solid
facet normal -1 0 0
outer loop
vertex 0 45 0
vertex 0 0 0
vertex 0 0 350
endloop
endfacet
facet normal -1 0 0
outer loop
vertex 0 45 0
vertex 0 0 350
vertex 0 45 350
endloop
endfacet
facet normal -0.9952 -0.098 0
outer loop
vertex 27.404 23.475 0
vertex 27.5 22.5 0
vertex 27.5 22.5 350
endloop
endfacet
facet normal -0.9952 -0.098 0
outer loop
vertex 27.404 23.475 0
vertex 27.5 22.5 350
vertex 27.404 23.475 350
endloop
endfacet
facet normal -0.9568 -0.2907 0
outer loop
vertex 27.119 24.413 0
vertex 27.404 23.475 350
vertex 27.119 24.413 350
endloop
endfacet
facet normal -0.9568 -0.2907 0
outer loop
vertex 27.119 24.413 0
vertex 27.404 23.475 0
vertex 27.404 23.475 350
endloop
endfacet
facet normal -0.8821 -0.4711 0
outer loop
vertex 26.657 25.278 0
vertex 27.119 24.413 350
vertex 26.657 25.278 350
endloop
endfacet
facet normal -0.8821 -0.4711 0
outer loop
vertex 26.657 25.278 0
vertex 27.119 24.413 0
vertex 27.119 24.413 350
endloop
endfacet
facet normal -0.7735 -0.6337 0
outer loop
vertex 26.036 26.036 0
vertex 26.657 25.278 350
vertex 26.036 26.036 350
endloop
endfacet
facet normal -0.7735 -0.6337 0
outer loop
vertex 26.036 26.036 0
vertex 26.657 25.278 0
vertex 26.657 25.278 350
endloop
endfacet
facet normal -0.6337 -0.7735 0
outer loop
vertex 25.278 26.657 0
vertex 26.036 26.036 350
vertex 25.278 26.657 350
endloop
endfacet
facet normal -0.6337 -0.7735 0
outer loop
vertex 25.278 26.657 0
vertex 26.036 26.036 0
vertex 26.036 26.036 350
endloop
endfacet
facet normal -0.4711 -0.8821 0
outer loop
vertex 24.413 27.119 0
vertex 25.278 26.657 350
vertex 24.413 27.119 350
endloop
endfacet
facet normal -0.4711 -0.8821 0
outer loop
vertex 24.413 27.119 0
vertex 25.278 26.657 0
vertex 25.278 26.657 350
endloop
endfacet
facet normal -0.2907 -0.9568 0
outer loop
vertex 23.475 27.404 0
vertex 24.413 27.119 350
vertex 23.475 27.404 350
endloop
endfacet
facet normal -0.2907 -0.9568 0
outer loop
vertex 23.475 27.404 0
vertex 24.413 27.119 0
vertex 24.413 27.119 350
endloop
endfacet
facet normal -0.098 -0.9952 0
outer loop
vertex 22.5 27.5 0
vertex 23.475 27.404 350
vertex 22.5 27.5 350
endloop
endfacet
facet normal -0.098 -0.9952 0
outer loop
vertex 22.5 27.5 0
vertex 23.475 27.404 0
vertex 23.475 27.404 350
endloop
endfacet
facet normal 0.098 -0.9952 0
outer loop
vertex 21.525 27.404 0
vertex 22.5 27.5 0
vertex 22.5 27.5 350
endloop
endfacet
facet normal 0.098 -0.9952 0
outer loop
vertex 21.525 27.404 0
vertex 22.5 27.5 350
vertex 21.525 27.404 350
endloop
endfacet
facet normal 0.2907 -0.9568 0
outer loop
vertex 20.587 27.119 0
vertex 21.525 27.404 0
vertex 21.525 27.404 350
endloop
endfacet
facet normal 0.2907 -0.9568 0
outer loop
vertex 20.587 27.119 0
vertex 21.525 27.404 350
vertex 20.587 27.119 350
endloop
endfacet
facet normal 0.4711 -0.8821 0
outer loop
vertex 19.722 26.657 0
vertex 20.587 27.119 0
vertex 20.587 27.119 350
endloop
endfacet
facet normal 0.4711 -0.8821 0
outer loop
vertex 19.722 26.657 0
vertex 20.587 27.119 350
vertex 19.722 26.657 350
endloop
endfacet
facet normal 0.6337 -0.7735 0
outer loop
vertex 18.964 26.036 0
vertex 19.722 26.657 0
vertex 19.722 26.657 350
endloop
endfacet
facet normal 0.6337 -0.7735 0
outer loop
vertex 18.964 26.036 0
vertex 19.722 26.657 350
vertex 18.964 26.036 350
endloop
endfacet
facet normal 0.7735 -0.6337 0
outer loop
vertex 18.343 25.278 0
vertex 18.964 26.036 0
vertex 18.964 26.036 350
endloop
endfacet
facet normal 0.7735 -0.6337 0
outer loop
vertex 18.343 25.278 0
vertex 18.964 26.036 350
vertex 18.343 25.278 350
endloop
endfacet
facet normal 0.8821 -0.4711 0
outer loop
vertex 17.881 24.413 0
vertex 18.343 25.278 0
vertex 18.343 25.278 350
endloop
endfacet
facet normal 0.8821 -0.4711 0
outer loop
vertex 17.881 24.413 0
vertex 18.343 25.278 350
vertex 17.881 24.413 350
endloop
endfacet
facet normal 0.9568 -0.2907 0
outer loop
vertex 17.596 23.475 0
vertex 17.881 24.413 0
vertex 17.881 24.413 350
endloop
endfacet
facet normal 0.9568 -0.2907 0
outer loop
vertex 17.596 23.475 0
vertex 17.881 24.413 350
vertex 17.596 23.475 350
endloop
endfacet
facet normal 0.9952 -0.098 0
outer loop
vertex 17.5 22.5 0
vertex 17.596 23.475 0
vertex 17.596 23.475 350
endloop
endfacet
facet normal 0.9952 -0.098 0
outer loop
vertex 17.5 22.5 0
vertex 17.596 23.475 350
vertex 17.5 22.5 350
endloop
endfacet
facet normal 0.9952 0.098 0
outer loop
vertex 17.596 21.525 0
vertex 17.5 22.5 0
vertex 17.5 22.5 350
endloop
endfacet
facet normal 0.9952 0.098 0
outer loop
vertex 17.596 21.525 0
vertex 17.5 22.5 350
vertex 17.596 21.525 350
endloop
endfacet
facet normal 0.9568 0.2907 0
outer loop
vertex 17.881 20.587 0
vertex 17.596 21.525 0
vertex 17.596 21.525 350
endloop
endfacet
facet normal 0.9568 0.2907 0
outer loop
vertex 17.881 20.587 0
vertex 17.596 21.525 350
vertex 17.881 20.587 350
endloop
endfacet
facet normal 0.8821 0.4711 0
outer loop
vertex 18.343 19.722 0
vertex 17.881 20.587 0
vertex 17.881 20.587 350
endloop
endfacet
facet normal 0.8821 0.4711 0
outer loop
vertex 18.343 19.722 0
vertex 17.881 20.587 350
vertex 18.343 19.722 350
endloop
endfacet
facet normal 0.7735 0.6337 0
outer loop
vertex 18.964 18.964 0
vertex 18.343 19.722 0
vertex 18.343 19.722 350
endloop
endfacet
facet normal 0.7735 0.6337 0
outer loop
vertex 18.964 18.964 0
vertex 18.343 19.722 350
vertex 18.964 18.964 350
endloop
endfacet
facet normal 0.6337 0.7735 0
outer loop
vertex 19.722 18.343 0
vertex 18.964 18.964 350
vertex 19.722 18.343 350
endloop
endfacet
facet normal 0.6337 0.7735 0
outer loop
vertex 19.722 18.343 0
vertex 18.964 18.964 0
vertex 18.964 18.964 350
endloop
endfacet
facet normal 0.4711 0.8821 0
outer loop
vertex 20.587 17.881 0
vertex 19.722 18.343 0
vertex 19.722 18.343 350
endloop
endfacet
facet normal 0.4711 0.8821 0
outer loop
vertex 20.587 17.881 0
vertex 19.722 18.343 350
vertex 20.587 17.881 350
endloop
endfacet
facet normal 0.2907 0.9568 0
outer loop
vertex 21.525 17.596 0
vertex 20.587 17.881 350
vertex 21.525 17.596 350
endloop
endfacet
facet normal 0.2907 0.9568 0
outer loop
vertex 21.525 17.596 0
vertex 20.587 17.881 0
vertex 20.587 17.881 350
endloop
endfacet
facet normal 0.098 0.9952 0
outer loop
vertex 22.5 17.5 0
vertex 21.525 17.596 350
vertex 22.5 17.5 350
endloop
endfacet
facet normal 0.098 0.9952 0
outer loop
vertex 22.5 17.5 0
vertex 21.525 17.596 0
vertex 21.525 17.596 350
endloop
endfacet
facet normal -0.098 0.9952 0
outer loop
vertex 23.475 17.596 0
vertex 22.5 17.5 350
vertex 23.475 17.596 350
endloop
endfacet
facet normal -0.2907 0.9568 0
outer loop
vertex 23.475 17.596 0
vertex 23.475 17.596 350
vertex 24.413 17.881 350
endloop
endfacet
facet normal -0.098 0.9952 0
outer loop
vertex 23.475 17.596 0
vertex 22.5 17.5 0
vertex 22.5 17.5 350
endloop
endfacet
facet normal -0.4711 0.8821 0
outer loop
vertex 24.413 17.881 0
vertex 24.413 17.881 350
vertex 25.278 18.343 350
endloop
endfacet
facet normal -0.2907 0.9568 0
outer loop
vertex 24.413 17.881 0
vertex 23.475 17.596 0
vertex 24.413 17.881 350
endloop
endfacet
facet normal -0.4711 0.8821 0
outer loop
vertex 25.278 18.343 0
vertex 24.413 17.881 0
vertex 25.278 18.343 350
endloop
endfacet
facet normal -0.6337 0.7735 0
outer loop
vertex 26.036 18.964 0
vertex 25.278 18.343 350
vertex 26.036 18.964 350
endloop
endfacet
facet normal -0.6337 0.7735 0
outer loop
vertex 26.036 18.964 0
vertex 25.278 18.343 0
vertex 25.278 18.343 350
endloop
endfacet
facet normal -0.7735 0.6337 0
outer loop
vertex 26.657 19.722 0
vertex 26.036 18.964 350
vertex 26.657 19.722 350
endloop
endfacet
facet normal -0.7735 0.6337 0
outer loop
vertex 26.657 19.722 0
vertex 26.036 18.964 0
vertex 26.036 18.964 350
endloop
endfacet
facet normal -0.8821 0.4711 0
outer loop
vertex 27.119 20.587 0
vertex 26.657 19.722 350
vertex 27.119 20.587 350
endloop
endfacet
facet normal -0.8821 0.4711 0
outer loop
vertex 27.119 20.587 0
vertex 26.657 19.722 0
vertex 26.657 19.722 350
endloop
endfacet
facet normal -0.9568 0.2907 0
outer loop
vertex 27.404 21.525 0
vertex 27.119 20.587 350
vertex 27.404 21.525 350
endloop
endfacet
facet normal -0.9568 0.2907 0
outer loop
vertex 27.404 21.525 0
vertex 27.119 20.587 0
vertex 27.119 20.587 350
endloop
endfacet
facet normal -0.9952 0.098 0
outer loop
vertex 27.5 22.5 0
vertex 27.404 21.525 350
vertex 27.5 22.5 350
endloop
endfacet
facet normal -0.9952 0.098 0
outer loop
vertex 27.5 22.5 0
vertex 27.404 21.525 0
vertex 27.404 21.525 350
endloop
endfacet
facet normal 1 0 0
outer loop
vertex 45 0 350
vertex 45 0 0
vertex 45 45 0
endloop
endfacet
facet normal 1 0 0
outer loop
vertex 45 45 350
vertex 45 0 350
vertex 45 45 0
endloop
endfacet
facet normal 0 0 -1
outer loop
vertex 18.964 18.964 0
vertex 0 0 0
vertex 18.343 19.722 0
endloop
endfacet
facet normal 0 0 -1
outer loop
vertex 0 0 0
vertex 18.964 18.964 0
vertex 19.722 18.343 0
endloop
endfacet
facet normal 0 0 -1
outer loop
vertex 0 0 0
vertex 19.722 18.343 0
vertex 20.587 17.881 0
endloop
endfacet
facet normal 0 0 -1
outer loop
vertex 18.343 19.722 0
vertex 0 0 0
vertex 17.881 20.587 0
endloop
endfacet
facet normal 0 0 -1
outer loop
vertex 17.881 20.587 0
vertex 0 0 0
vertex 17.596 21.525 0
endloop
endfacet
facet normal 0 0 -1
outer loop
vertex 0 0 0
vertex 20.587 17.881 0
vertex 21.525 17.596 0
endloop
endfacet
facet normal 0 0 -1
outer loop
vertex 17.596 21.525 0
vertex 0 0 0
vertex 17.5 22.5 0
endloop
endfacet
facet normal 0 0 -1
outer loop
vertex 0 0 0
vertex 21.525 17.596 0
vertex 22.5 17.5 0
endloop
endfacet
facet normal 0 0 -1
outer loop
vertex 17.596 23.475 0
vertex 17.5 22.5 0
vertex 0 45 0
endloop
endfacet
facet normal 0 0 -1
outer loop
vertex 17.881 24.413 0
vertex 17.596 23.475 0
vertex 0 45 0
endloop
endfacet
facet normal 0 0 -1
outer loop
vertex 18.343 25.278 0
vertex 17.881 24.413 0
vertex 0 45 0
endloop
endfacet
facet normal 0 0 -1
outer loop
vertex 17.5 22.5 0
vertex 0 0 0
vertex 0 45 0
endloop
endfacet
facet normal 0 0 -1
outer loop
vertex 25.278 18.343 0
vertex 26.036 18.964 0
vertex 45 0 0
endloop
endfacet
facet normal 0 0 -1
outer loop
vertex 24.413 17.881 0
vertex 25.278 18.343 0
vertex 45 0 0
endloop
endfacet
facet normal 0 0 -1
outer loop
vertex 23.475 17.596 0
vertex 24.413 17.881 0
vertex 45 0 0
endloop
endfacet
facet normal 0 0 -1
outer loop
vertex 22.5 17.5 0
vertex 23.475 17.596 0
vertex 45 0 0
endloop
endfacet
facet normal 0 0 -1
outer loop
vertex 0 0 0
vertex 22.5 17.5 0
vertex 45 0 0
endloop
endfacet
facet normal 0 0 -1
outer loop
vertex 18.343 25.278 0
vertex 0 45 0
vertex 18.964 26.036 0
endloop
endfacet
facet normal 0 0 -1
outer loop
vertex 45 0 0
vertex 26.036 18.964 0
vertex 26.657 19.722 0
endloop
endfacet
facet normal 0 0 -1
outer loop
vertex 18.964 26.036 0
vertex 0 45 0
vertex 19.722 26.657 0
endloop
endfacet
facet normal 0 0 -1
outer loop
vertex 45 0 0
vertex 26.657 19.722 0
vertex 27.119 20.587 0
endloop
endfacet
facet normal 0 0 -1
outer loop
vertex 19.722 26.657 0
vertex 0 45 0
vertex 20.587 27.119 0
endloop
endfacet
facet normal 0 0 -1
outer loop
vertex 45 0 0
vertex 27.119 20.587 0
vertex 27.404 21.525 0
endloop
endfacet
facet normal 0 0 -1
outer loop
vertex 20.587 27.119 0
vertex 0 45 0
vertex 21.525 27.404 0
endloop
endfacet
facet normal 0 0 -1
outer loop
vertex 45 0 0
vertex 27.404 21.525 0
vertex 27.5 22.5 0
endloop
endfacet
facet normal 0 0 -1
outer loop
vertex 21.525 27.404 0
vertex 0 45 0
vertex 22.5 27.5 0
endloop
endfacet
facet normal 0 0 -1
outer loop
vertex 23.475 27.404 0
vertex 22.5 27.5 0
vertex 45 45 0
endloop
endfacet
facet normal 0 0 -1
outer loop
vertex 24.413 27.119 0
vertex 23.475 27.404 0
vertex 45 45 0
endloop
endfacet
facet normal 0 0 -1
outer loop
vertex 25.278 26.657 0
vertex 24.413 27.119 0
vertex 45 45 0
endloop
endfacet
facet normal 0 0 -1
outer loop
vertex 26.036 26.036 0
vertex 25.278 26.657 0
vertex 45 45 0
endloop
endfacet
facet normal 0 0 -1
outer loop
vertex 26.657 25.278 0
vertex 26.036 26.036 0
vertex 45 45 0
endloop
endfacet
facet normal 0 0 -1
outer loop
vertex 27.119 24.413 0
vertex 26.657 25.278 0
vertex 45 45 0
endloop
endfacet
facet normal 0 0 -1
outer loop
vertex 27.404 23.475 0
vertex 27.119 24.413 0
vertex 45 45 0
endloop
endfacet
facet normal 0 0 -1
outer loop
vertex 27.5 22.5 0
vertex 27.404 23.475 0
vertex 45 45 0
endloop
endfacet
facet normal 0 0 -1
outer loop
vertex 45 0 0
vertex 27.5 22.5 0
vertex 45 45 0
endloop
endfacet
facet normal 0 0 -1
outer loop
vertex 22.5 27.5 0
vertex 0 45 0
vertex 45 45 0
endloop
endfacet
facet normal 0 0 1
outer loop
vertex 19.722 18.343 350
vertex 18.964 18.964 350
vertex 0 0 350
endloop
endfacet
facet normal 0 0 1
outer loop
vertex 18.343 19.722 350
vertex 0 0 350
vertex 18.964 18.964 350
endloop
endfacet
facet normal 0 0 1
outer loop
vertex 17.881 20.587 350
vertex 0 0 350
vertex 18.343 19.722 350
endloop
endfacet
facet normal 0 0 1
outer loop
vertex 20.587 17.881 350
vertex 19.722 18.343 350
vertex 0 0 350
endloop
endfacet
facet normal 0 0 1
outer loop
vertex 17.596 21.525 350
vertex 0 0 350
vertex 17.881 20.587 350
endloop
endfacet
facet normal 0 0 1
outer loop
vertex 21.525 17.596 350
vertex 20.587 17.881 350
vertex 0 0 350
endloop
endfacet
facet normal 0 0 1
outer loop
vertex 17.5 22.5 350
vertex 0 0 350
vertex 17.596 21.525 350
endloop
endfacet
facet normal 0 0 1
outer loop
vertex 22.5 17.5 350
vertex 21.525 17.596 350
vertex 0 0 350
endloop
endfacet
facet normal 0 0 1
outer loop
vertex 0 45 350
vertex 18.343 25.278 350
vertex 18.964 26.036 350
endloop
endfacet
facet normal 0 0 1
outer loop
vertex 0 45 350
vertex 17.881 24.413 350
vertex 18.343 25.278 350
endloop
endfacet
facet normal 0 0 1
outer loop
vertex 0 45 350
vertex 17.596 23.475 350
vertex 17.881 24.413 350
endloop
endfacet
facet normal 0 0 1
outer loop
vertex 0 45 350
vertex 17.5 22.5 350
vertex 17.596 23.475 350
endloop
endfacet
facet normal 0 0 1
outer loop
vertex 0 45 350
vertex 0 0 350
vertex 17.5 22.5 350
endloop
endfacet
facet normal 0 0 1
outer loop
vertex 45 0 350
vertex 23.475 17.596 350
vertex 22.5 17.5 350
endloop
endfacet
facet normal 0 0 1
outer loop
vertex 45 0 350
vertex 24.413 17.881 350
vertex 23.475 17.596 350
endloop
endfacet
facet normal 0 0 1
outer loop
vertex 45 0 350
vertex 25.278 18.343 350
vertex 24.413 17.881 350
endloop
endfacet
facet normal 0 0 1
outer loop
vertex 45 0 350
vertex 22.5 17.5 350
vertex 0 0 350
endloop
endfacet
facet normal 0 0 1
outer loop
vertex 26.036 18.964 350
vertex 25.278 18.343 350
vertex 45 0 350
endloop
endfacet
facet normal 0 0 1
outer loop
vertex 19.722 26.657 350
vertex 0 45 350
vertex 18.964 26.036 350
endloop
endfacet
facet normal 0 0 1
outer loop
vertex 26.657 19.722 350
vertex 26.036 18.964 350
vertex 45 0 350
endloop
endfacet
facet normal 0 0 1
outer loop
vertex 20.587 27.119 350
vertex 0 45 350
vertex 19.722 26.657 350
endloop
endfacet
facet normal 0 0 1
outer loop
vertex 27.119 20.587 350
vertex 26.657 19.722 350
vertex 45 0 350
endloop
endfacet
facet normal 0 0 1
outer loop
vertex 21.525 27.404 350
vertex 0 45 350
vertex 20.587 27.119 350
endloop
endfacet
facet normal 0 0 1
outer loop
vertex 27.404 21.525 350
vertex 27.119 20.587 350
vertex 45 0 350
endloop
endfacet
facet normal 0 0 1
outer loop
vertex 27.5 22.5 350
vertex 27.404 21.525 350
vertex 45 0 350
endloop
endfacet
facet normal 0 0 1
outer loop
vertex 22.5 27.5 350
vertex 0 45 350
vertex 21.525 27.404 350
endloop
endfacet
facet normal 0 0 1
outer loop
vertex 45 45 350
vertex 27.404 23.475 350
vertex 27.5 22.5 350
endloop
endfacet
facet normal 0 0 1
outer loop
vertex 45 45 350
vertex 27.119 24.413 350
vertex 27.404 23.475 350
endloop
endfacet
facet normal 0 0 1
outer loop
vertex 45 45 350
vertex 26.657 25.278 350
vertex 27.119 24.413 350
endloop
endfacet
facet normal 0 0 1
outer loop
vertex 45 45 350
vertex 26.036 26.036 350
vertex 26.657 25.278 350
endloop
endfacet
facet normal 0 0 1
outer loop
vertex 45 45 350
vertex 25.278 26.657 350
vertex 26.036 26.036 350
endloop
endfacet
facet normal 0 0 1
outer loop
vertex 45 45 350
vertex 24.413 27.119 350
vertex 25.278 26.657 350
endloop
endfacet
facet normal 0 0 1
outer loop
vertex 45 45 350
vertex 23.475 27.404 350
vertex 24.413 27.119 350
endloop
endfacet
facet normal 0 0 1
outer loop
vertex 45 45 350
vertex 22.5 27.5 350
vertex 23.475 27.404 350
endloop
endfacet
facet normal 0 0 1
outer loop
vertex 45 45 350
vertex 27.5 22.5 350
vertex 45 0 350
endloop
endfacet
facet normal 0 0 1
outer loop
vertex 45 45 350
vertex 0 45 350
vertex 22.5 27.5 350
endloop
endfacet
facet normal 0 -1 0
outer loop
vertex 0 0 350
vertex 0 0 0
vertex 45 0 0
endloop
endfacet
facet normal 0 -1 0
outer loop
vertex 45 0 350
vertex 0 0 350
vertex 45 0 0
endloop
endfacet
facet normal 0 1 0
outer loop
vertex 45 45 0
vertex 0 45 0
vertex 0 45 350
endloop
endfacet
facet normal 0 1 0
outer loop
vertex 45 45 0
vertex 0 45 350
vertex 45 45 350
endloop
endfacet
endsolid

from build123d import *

# Parameters (mm, degrees)
CYLINDER_R     = 5
CYLINDER_DEPTH = 500
BOX_W          = 45
BOX_H          = 45
BOX_DEPTH      = 350


with BuildPart() as screwhole:
    # Cylinder → Cylinder (new body)
    with BuildSketch(Plane(origin=(22.5, 22.5, -150), x_dir=(1, 0, 0), z_dir=(0, 0, 1))):
        Circle(CYLINDER_R)
    extrude(amount=CYLINDER_DEPTH)


with BuildPart() as screwedleg:
    # Box → Box (new body)
    with BuildSketch(Plane.XY):
        with Locations((22.5, 22.5)):
            Rectangle(BOX_W, BOX_H)
    extrude(amount=BOX_DEPTH)

    # Cut: cut ScrewHole
    add(screwhole.part, mode=Mode.SUBTRACT)


solid = screwedleg.part
